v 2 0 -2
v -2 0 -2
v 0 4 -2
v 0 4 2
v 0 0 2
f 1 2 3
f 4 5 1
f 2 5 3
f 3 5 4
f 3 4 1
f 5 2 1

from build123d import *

# Parameters (mm, degrees)
SKETCH1_W           = 4
SKETCH1_H           = 4
BOSS_EXTRUDE1_DEPTH = 4
CUT_EXTRUDE1_DEPTH  = 10
CUT_EXTRUDE2_DEPTH  = 10
CUT_EXTRUDE3_DEPTH  = 10


with BuildPart() as part:
    # Sketch1 → Boss-Extrude1 (new body)
    with BuildSketch(Plane(origin=(0, 0, 0), x_dir=(1, 0, 0), z_dir=(0, 1, 0))):
        Rectangle(SKETCH1_W, SKETCH1_H)
    extrude(amount=BOSS_EXTRUDE1_DEPTH)

    # 3DSketch1 → Cut-Extrude1 (cut, along a direction that is not the sketch's normal)
    with BuildSketch(Plane(origin=(0, 4, -2), x_dir=(0, -0.7071067811865476, 0.7071067811865476), z_dir=(0.816496580927726, -0.408248290463863, -0.408248290463863))):
        Polygon((0, 0), (2.828427125, 3.464101615), (5.656854249, 0), align=None)
    extrude(amount=-CUT_EXTRUDE1_DEPTH, dir=(0, -1, 0), mode=Mode.SUBTRACT)


with BuildPart() as body_2:
    # of the pieces the cut leaves, the one that is kept (cut_extrude1_keep)
    add(part.part.solids().sort_by_distance((2, 0, 2))[0])

    # Sketch2 → Cut-Extrude2 (cut)
    with BuildSketch(Plane.XY.offset(2)):
        Polygon((0, 4), (2, 0), (2, 4), align=None)
    extrude(amount=-CUT_EXTRUDE2_DEPTH, mode=Mode.SUBTRACT)

    # Sketch3 → Cut-Extrude3 (cut)
    with BuildSketch(Plane.XZ):
        Polygon((0, 2), (2, -2), (2, 2), align=None)
    extrude(amount=-CUT_EXTRUDE3_DEPTH, mode=Mode.SUBTRACT)


solid = body_2.part
